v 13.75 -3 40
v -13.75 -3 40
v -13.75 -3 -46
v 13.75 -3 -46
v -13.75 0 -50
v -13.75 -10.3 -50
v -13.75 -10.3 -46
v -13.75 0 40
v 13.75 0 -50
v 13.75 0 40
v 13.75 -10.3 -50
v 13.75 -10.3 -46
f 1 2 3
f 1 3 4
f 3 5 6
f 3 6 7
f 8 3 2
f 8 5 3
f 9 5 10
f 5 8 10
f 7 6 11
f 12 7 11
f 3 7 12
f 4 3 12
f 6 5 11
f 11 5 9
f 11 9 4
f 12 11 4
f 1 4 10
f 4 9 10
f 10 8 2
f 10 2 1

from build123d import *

# Parameters (mm, degrees)
F0_W     = 27.5
F0_H     = 90
F1_DEPTH = 3
F2_W     = 27.5
F2_H     = 10.3
F3_DEPTH = 4


with BuildPart() as f1:
    # F0 (on Front) → F1 (new body)
    with BuildSketch(Plane.XZ):
        with Locations((0, -5)):
            Rectangle(F0_W, F0_H)
    extrude(amount=F1_DEPTH)

    # F2 (on face) → F3 (join)
    with BuildSketch(Plane(origin=(0, 0, -50), x_dir=(1, 0, 0), z_dir=(0, 0, -1))):
        with Locations((0, 5.15)):
            Rectangle(F2_W, F2_H)
    extrude(amount=-F3_DEPTH)


solid = f1.part
